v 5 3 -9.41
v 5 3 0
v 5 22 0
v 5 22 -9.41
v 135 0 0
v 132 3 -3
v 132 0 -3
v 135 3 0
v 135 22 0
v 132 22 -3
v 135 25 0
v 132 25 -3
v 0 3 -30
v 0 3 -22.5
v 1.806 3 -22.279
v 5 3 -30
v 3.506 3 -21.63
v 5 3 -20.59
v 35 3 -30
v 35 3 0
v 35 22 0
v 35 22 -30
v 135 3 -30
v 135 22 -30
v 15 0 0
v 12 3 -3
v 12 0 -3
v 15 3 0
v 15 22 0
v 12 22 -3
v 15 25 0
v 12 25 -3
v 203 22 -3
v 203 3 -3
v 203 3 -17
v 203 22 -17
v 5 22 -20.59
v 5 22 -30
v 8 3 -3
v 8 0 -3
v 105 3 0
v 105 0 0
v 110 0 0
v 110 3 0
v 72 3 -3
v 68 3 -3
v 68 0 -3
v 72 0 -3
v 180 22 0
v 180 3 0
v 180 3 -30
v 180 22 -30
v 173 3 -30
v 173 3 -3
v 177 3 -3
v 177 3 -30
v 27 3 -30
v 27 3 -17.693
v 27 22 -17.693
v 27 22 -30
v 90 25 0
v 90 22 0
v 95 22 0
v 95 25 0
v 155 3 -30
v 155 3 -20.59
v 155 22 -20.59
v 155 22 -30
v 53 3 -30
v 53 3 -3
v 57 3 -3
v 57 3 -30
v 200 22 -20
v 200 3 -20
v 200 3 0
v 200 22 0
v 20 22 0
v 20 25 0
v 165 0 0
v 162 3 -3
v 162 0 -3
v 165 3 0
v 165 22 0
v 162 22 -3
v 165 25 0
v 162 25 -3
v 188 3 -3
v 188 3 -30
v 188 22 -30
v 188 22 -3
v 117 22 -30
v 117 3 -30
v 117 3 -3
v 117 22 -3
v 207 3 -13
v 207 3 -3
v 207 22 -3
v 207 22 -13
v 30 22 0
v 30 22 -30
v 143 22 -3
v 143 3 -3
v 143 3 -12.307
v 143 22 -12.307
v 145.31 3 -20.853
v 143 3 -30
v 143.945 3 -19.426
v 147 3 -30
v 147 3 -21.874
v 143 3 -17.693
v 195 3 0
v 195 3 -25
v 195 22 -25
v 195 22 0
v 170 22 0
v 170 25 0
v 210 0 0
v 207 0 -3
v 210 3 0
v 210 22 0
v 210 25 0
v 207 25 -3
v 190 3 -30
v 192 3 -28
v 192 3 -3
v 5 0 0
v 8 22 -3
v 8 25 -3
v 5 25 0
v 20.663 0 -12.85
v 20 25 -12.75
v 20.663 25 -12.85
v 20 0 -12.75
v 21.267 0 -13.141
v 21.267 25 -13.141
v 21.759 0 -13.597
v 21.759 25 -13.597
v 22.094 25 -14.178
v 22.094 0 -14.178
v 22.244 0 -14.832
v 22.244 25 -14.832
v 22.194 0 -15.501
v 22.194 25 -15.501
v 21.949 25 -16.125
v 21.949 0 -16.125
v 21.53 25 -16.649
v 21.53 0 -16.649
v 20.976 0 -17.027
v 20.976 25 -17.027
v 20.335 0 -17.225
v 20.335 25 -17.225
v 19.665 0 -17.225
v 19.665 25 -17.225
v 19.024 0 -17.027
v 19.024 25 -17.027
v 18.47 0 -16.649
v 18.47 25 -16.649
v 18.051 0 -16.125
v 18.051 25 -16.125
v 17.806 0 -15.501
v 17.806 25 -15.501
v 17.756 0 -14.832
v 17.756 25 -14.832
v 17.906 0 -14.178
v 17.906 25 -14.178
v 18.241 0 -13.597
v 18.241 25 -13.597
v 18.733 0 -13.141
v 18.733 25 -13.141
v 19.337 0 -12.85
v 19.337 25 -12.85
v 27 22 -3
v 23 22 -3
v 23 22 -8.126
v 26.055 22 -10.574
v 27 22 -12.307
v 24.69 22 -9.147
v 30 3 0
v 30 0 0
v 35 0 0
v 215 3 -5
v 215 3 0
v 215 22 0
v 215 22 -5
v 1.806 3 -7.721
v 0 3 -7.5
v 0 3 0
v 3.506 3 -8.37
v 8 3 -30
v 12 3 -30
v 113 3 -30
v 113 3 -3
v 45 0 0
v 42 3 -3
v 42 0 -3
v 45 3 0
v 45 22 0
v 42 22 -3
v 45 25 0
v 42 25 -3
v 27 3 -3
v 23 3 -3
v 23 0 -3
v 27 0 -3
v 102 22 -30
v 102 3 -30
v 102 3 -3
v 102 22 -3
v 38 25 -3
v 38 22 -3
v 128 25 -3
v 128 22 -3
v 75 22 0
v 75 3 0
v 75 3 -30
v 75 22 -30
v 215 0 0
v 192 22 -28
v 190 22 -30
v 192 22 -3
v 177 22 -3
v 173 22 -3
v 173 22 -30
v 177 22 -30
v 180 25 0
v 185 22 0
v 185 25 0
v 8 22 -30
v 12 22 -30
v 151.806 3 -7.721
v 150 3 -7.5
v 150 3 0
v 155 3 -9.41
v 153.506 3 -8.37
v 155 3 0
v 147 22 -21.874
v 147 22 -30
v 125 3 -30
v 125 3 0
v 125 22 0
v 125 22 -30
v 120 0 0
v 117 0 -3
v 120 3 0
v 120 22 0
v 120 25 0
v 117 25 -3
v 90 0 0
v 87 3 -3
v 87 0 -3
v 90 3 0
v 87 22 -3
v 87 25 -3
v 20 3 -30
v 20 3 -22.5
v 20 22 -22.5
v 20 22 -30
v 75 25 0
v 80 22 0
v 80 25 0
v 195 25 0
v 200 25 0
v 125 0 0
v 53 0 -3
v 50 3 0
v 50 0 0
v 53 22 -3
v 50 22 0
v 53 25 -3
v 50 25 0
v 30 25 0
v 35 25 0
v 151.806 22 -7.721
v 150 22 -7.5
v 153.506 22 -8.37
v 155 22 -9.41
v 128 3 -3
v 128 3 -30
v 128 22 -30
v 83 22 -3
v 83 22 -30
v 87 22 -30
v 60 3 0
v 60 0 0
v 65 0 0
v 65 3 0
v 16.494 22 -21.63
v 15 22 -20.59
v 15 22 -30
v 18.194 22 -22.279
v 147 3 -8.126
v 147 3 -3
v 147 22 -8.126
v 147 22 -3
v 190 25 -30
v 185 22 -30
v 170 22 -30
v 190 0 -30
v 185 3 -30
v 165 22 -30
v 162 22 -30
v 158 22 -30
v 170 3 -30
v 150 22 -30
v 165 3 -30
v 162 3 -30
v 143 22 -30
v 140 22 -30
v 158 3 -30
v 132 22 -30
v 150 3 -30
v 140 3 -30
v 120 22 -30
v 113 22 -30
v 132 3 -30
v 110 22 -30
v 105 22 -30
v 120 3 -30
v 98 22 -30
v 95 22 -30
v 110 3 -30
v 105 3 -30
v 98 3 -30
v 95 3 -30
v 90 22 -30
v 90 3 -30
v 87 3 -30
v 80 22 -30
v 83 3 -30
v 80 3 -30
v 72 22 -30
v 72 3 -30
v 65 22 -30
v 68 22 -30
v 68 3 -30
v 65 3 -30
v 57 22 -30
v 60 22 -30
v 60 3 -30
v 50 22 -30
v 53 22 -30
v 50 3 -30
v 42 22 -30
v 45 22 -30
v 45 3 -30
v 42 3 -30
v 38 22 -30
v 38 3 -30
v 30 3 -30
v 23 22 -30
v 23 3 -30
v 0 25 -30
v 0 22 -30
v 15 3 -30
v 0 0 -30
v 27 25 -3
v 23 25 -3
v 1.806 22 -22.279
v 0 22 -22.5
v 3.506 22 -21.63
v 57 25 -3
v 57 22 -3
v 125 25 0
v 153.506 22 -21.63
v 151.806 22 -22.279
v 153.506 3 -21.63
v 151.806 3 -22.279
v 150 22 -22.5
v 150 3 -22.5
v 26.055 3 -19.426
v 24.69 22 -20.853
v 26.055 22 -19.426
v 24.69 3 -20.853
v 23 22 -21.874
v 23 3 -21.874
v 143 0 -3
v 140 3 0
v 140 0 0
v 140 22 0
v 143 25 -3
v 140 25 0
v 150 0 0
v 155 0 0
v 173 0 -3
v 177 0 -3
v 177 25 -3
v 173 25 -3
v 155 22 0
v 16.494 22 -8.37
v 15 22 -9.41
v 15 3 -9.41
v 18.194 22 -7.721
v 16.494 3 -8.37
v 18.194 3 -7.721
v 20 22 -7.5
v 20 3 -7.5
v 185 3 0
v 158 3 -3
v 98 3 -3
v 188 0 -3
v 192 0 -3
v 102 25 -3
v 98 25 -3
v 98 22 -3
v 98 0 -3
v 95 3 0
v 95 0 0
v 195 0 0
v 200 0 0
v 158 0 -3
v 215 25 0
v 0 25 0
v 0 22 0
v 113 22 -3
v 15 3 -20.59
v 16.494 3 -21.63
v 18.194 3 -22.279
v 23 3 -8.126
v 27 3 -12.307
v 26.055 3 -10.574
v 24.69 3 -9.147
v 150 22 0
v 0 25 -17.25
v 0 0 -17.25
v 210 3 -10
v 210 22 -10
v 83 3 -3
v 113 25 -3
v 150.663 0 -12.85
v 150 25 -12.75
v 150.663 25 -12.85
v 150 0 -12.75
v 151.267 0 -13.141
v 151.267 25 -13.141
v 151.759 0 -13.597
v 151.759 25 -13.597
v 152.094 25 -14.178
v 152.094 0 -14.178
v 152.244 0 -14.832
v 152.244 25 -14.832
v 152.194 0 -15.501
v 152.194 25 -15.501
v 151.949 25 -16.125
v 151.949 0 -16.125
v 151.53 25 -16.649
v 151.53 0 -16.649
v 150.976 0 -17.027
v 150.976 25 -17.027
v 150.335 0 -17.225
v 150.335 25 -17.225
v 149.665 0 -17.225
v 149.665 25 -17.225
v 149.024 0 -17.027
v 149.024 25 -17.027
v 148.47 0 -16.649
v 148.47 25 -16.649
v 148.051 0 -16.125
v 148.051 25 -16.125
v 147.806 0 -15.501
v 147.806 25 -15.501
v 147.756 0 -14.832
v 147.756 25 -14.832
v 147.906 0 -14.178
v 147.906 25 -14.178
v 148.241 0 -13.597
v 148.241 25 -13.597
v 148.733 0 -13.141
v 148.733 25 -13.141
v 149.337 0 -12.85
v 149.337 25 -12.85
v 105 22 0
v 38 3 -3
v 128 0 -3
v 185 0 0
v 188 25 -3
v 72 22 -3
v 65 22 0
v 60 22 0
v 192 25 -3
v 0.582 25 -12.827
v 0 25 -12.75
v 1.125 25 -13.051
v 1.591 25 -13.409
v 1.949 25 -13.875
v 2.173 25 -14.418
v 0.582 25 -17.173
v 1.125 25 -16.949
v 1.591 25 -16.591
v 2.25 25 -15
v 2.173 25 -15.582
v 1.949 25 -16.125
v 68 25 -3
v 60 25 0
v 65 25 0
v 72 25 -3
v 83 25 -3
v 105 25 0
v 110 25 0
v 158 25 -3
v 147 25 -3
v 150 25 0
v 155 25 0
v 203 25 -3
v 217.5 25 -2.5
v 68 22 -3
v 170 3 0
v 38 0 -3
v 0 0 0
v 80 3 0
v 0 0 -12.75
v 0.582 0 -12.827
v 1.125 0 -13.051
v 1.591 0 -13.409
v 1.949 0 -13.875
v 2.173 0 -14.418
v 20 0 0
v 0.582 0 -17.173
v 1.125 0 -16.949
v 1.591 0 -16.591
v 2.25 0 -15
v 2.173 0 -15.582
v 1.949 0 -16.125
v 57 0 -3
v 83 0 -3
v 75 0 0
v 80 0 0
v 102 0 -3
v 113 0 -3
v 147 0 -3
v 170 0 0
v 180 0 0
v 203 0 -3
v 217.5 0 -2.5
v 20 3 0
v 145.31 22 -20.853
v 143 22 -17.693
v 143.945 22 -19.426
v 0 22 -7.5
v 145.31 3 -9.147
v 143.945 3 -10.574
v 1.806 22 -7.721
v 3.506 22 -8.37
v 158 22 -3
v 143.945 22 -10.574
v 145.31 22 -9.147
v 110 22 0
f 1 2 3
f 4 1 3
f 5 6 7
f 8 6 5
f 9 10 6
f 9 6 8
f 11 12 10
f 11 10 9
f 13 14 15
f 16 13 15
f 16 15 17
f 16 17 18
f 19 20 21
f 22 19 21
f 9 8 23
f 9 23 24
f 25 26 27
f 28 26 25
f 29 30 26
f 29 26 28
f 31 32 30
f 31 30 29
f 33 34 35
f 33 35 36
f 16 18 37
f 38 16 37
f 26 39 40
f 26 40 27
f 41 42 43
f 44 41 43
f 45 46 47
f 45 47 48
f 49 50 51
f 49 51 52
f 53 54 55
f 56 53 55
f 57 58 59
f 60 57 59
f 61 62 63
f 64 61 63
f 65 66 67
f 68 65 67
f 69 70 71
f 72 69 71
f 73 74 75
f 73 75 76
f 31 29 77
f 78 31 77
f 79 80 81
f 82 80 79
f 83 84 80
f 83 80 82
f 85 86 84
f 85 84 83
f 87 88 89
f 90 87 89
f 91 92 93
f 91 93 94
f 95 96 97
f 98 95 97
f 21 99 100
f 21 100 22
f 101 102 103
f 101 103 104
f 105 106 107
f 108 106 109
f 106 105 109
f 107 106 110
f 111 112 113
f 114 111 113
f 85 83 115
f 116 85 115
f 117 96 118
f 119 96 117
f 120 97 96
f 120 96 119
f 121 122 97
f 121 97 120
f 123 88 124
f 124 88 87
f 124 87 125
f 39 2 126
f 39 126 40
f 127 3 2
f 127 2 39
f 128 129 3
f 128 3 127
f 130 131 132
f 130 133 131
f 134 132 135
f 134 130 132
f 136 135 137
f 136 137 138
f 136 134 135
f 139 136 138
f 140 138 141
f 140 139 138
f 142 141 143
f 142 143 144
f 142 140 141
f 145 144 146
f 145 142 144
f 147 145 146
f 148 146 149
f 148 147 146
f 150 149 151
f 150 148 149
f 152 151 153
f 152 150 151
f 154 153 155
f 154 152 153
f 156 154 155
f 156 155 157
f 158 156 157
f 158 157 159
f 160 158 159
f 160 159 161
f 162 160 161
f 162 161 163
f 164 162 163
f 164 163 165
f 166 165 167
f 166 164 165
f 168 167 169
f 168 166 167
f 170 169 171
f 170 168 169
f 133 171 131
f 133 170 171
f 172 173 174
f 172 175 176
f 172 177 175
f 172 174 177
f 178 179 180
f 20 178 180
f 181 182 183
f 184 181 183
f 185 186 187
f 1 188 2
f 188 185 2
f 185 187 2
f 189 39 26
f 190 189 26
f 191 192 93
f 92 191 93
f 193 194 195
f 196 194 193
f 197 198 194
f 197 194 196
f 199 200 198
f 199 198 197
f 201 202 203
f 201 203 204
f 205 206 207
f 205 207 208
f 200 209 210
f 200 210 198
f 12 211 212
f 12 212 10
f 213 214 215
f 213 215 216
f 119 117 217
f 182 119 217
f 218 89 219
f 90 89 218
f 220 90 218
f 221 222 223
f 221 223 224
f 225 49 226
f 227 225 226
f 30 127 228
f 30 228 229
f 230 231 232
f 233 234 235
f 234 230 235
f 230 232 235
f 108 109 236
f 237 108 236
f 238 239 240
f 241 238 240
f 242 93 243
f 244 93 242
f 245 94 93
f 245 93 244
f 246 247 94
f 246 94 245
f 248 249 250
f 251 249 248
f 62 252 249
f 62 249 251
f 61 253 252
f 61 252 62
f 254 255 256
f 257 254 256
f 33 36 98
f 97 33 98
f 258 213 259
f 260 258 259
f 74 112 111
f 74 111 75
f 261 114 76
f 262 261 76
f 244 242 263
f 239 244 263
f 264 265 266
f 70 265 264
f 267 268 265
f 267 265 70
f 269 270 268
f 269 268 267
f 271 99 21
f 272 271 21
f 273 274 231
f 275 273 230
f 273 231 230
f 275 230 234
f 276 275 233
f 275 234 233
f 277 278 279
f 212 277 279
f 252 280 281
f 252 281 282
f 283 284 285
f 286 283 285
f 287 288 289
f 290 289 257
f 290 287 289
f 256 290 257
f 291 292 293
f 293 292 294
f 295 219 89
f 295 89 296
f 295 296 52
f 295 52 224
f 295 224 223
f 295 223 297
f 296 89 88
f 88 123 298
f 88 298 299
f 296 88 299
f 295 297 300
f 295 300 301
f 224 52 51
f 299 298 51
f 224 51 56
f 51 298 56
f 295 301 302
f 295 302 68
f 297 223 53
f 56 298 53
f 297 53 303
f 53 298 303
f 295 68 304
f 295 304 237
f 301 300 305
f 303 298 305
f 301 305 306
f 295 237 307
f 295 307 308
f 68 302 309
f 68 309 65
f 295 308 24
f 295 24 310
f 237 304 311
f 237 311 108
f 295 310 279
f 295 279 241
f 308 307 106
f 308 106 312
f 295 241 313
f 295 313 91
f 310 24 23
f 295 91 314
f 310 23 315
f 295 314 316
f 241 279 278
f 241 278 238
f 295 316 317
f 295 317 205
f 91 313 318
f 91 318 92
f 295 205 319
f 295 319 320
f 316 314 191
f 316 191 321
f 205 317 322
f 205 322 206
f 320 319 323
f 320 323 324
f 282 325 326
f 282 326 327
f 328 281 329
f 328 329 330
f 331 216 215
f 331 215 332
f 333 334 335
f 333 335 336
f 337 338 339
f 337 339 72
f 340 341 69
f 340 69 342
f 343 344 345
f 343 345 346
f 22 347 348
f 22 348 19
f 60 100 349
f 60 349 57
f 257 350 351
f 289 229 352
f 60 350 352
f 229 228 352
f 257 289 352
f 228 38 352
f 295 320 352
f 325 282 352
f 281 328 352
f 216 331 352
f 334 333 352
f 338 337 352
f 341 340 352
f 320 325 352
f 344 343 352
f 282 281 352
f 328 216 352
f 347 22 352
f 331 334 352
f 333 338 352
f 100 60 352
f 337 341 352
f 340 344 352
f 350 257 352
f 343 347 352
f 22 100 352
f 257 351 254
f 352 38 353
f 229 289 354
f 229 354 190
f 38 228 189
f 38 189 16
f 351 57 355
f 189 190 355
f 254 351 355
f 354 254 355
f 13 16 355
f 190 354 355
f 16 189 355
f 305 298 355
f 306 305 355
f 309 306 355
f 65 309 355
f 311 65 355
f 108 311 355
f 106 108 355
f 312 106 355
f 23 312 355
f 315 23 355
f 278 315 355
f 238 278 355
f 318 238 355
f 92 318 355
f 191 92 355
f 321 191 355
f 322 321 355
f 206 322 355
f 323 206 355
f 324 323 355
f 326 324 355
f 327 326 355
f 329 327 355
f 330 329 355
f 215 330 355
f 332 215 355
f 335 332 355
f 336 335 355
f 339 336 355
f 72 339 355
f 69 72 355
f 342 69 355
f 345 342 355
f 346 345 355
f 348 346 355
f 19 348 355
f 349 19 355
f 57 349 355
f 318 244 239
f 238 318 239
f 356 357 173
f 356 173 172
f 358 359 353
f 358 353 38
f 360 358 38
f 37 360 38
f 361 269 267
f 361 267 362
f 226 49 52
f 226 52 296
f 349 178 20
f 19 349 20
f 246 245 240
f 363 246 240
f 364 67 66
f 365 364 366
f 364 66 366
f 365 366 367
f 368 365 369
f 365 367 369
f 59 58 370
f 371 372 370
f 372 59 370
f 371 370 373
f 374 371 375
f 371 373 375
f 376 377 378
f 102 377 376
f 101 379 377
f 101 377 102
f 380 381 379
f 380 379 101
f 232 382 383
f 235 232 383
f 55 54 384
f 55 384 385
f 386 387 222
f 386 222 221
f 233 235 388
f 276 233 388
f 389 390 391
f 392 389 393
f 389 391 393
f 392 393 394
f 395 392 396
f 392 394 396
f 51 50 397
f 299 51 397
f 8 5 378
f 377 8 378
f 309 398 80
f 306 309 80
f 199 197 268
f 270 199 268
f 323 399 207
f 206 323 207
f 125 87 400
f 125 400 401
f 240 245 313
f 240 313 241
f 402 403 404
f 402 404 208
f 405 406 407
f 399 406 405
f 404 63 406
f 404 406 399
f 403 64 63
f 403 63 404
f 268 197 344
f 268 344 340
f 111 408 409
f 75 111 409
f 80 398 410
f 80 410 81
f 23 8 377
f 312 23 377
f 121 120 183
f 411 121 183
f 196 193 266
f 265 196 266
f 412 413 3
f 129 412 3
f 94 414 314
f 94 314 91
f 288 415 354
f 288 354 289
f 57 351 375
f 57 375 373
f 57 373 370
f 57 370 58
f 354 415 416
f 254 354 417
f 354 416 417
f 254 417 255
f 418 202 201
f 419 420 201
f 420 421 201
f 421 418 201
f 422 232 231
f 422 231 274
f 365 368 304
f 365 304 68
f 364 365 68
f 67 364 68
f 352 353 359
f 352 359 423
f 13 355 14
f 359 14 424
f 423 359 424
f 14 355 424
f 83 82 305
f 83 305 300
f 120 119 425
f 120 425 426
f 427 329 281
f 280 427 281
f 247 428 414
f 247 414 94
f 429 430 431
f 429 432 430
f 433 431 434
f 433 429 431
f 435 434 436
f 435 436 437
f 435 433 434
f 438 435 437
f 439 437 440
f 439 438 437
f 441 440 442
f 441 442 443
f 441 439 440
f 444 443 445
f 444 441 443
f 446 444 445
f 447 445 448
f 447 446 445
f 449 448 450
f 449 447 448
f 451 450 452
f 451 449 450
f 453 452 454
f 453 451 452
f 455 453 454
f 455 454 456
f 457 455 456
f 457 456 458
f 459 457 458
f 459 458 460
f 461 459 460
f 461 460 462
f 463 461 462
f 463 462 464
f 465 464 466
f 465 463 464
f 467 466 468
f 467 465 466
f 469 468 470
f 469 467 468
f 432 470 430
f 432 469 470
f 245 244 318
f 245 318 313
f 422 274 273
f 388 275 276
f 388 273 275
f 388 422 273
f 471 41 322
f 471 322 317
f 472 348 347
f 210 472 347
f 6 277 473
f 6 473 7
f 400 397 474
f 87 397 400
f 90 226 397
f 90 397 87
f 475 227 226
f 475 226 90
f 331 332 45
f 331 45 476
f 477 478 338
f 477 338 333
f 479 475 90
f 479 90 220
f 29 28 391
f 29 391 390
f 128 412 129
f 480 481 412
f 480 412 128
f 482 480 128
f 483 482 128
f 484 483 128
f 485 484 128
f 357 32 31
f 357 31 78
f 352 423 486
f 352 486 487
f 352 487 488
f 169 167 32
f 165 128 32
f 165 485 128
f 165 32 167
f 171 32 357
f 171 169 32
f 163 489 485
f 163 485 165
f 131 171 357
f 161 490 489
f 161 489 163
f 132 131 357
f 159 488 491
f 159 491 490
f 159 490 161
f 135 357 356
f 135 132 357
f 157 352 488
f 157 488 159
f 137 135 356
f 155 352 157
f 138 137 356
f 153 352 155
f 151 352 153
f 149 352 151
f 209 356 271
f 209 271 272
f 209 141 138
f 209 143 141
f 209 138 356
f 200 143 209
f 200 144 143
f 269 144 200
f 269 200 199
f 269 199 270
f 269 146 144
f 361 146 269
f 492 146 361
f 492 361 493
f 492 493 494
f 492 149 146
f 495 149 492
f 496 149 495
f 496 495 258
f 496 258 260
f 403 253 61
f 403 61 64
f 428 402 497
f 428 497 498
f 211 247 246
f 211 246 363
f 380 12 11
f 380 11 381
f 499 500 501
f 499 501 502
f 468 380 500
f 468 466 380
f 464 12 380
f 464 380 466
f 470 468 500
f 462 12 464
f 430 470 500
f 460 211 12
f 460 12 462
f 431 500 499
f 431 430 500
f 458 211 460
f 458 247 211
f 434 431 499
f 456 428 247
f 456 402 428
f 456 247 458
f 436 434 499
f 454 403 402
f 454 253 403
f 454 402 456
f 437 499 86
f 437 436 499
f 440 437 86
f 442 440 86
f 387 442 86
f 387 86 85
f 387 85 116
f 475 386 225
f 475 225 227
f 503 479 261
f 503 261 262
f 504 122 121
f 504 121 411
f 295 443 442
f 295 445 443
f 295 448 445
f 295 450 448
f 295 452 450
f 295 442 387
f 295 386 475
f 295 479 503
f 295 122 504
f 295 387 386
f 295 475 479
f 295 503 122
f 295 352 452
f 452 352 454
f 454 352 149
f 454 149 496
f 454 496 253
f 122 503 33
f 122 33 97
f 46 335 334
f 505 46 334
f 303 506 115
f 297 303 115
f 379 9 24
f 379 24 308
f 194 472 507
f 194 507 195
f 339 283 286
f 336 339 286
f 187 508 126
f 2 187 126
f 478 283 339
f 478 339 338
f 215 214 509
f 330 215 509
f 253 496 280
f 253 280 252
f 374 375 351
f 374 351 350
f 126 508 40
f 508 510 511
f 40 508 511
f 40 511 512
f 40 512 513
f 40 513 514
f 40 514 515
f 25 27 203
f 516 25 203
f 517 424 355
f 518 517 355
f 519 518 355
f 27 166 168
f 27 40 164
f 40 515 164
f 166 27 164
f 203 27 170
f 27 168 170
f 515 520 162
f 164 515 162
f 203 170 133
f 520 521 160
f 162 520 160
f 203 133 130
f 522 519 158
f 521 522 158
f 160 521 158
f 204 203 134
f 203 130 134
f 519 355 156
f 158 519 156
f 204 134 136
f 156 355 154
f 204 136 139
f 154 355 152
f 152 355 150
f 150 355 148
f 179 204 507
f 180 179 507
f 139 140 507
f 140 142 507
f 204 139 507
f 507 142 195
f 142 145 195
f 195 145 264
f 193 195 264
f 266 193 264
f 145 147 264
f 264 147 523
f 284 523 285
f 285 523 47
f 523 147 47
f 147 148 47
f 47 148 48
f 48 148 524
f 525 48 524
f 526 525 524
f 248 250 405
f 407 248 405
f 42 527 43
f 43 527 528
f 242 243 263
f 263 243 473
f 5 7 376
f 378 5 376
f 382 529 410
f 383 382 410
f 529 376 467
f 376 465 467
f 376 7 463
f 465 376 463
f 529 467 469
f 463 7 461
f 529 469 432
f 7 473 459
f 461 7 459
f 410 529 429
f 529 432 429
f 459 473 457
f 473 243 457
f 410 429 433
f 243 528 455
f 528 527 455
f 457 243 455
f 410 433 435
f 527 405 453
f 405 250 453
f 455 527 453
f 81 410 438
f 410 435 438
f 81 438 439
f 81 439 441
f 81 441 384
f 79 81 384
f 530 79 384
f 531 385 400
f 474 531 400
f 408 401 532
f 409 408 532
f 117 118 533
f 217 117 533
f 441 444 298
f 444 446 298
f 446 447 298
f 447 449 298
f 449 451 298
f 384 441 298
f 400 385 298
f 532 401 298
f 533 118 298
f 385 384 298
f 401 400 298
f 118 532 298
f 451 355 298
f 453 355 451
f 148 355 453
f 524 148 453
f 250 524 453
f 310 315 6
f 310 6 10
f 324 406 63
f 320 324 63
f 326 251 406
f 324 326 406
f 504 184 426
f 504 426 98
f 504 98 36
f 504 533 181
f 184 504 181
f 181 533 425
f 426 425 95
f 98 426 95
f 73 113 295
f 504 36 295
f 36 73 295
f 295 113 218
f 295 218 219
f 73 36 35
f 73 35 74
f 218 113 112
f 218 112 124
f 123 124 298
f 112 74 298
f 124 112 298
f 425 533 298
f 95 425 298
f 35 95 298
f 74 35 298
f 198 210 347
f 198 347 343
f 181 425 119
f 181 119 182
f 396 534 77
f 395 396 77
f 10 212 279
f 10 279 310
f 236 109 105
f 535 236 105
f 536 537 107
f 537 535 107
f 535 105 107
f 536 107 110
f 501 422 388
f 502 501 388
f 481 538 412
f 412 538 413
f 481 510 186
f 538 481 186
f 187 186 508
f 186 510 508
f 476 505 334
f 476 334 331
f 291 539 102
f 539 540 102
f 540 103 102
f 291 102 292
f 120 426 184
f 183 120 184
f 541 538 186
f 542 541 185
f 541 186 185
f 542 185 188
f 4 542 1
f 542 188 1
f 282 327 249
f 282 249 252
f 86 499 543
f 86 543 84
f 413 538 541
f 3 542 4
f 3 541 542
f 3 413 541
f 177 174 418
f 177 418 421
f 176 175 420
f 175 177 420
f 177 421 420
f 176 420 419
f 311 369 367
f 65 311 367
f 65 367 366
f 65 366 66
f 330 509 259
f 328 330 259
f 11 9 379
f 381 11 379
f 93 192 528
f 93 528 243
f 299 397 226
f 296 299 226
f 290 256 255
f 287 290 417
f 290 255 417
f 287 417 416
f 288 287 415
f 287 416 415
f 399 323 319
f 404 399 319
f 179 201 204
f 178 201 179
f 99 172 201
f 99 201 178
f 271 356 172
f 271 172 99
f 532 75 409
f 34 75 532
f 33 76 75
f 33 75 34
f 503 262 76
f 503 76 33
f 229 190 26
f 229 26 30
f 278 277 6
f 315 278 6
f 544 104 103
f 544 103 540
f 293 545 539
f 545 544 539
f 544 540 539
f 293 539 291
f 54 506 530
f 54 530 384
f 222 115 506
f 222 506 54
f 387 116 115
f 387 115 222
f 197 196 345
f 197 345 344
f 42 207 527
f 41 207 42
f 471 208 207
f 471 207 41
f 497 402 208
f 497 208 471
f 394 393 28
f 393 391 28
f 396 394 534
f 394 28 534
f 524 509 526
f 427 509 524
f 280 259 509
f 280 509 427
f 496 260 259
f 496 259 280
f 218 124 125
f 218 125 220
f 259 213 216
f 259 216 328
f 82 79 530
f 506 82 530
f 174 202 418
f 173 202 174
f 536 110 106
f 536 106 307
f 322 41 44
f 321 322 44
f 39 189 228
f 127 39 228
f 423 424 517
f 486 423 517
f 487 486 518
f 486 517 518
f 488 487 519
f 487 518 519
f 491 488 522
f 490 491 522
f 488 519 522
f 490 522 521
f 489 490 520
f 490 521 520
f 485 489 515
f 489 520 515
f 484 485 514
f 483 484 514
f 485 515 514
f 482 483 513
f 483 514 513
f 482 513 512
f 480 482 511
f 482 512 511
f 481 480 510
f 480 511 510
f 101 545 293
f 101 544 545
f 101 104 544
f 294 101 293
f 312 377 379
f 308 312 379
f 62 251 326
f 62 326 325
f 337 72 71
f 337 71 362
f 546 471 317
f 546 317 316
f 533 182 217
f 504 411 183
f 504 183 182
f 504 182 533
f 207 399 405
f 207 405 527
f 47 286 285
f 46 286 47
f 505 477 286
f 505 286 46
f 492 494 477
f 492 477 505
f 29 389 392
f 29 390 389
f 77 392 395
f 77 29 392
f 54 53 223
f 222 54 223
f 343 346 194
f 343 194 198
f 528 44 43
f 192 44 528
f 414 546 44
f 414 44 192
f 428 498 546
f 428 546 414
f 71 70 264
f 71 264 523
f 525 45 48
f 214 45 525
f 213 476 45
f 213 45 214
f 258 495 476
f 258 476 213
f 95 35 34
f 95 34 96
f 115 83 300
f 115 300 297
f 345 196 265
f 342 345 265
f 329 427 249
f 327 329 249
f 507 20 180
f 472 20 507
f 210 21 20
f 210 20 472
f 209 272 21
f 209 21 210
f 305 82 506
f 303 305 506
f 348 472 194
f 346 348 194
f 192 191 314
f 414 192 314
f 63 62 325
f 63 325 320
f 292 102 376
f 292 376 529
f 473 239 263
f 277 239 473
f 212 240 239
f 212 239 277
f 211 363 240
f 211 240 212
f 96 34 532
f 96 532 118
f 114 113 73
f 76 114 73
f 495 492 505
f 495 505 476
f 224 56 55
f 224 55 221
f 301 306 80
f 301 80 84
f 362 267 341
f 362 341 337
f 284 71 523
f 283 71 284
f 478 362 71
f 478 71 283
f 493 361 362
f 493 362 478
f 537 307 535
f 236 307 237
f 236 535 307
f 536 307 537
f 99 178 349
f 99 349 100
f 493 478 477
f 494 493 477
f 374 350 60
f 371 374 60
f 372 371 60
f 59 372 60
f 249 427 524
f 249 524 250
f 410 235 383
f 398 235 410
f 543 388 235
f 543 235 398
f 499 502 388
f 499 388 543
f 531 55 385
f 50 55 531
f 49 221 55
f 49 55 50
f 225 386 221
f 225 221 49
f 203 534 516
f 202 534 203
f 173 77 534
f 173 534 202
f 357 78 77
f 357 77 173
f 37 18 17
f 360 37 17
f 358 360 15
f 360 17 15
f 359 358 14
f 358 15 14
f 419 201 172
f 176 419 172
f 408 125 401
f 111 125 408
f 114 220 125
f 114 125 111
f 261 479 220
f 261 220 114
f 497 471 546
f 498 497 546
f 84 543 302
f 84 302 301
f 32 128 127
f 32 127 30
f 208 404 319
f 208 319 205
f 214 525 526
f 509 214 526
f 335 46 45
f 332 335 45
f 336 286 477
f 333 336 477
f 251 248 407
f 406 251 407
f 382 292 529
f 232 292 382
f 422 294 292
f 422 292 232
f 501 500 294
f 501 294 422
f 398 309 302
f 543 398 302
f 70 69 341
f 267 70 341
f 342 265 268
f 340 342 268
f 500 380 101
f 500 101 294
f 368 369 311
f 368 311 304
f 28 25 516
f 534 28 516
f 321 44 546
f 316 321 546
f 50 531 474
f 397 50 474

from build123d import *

# Parameters (mm, degrees)
SKETCH3_R           = 2.25
BOSS_EXTRUDE2_DEPTH = 25
CUT_EXTRUDE2_DEPTH  = 54
SKETCH7_W           = 4
SKETCH7_H           = 19
CUT_EXTRUDE3_DEPTH  = 54
SKETCH8_W           = 5
SKETCH8_H           = 19
CUT_EXTRUDE4_DEPTH  = 54
BOSS_EXTRUDE3_START = -25
SKETCH9_R           = 7.5
SKETCH9_R_2         = 2.25
BOSS_EXTRUDE3_DEPTH = 25


with BuildPart() as part:
    # Sketch3 → Boss-Extrude2 (new body)
    with BuildSketch(Plane(origin=(0, 0, 0), x_dir=(1, 0, 0), z_dir=(0, 1, 0))):
        with BuildLine():
            Line((0, 12.75), (0, 0))
            Line((0, 0), (220, 0))
            Line((220, 0), (190, 30))
            Line((190, 30), (0, 30))
            Line((0, 30), (0, 17.25))
            ThreePointArc((0, 17.25), (1.590990258, 16.590990258), (2.25, 15))
            ThreePointArc((2.25, 15), (1.590990258, 13.409009742), (0, 12.75))
        make_face()
        with Locations(Location((20, 15, 0), (0, 0, 270))):
            Circle(SKETCH3_R, mode=Mode.SUBTRACT)
        with Locations(Location((150, 15, 0), (0, 0, 270))):
            Circle(SKETCH3_R, mode=Mode.SUBTRACT)
    extrude(amount=BOSS_EXTRUDE2_DEPTH)

    # Sketch6 → Cut-Extrude2 (cut)
    with BuildSketch(Plane(origin=(0, 25, 0), x_dir=(1, 0, 0), z_dir=(0, 1, 0))):
        Polygon((0, 0), (5, 0), (8, 3), (12, 3), (15, 0), (20, 0), (23, 3), (27, 3), (30, 0), (35, 0), (38, 3), (42, 3), (45, 0), (50, 0), (53, 3), (57, 3), (60, 0), (65, 0), (68, 3), (72, 3), (75, 0), (80, 0), (83, 3), (87, 3), (90, 0), (95, 0), (98, 3), (102, 3), (105, 0), (110, 0), (113, 3), (117, 3), (120, 0), (125, 0), (128, 3), (132, 3), (135, 0), (140, 0), (143, 3), (147, 3), (150, 0), (155, 0), (158, 3), (162, 3), (165, 0), (170, 0), (173, 3), (177, 3), (180, 0), (185, 0), (188, 3), (192, 3), (195, 0), (200, 0), (203, 3), (207, 3), (210, 0), (215, 0), (218, 3), (222, 3), (225, 0), (225, -19.034705474), (0, -19.034705474), align=None)
    extrude(amount=-CUT_EXTRUDE2_DEPTH, mode=Mode.SUBTRACT)

    # Sketch7 → Cut-Extrude3 (cut)
    with BuildSketch(Plane.XY.offset(-3)):
        with Locations((10, 12.5)):
            Rectangle(SKETCH7_W, SKETCH7_H)
        with Locations((25, 12.5)):
            Rectangle(SKETCH7_W, SKETCH7_H)
        with Locations((40, 12.5)):
            Rectangle(SKETCH7_W, SKETCH7_H)
        with Locations((55, 12.5)):
            Rectangle(SKETCH7_W, SKETCH7_H)
        with Locations((70, 12.5)):
            Rectangle(SKETCH7_W, SKETCH7_H)
        with Locations((85, 12.5)):
            Rectangle(SKETCH7_W, SKETCH7_H)
        with Locations((100, 12.5)):
            Rectangle(SKETCH7_W, SKETCH7_H)
        with Locations((115, 12.5)):
            Rectangle(SKETCH7_W, SKETCH7_H)
        with Locations((130, 12.5)):
            Rectangle(SKETCH7_W, SKETCH7_H)
        with Locations((145, 12.5)):
            Rectangle(SKETCH7_W, SKETCH7_H)
        with Locations((160, 12.5)):
            Rectangle(SKETCH7_W, SKETCH7_H)
        with Locations((175, 12.5)):
            Rectangle(SKETCH7_W, SKETCH7_H)
        with Locations((190, 12.5)):
            Rectangle(SKETCH7_W, SKETCH7_H)
        with Locations((205, 12.5)):
            Rectangle(SKETCH7_W, SKETCH7_H)
        with Locations((220, 12.5)):
            Rectangle(SKETCH7_W, SKETCH7_H)
    extrude(amount=-CUT_EXTRUDE3_DEPTH, mode=Mode.SUBTRACT)

    # Sketch8 → Cut-Extrude4 (cut)
    with BuildSketch(Plane.XY):
        with Locations((2.5, 12.5)):
            Rectangle(SKETCH8_W, SKETCH8_H)
        with Locations((17.5, 12.5)):
            Rectangle(SKETCH8_W, SKETCH8_H)
        with Locations((32.5, 12.5)):
            Rectangle(SKETCH8_W, SKETCH8_H)
        with Locations((47.5, 12.5)):
            Rectangle(SKETCH8_W, SKETCH8_H)
        with Locations((62.5, 12.5)):
            Rectangle(SKETCH8_W, SKETCH8_H)
        with Locations((77.5, 12.5)):
            Rectangle(SKETCH8_W, SKETCH8_H)
        with Locations((92.5, 12.5)):
            Rectangle(SKETCH8_W, SKETCH8_H)
        with Locations((107.5, 12.5)):
            Rectangle(SKETCH8_W, SKETCH8_H)
        with Locations((122.5, 12.5)):
            Rectangle(SKETCH8_W, SKETCH8_H)
        with Locations((137.5, 12.5)):
            Rectangle(SKETCH8_W, SKETCH8_H)
        with Locations((152.5, 12.5)):
            Rectangle(SKETCH8_W, SKETCH8_H)
        with Locations((167.5, 12.5)):
            Rectangle(SKETCH8_W, SKETCH8_H)
        with Locations((182.5, 12.5)):
            Rectangle(SKETCH8_W, SKETCH8_H)
        with Locations((197.5, 12.5)):
            Rectangle(SKETCH8_W, SKETCH8_H)
        with Locations((212.5, 12.5)):
            Rectangle(SKETCH8_W, SKETCH8_H)
    extrude(amount=-CUT_EXTRUDE4_DEPTH, mode=Mode.SUBTRACT)

    # Sketch9 → Boss-Extrude3 (add)
    # profile 1 of 3: a face of its own
    with BuildSketch(Plane(origin=(0, 25, 0), x_dir=(1, 0, 0), z_dir=(0, 1, 0)).offset(BOSS_EXTRUDE3_START)):
        with Locations((20, 15)):
            Circle(SKETCH9_R)
        with Locations(Location((20, 15, 0), (0, 0, 270))):
            Circle(SKETCH9_R_2, mode=Mode.SUBTRACT)
    # profile 2 of 3: a face of its own
    with BuildSketch(Plane(origin=(0, 25, 0), x_dir=(1, 0, 0), z_dir=(0, 1, 0)).offset(BOSS_EXTRUDE3_START)):
        with Locations((150, 15)):
            Circle(SKETCH9_R)
        with Locations(Location((150, 15, 0), (0, 0, 270))):
            Circle(SKETCH9_R_2, mode=Mode.SUBTRACT)
    # profile 3 of 3: a face of its own
    with BuildSketch(Plane(origin=(0, 25, 0), x_dir=(1, 0, 0), z_dir=(0, 1, 0)).offset(BOSS_EXTRUDE3_START)):
        with BuildLine():
            Line((0, 22.5), (0, 17.25))
            ThreePointArc((0, 17.25), (2.25, 15), (0, 12.75))
            Line((0, 12.75), (0, 7.5))
            ThreePointArc((0, 7.5), (7.5, 15), (0, 22.5))
        make_face()
    extrude(amount=BOSS_EXTRUDE3_DEPTH)


solid = part.part
